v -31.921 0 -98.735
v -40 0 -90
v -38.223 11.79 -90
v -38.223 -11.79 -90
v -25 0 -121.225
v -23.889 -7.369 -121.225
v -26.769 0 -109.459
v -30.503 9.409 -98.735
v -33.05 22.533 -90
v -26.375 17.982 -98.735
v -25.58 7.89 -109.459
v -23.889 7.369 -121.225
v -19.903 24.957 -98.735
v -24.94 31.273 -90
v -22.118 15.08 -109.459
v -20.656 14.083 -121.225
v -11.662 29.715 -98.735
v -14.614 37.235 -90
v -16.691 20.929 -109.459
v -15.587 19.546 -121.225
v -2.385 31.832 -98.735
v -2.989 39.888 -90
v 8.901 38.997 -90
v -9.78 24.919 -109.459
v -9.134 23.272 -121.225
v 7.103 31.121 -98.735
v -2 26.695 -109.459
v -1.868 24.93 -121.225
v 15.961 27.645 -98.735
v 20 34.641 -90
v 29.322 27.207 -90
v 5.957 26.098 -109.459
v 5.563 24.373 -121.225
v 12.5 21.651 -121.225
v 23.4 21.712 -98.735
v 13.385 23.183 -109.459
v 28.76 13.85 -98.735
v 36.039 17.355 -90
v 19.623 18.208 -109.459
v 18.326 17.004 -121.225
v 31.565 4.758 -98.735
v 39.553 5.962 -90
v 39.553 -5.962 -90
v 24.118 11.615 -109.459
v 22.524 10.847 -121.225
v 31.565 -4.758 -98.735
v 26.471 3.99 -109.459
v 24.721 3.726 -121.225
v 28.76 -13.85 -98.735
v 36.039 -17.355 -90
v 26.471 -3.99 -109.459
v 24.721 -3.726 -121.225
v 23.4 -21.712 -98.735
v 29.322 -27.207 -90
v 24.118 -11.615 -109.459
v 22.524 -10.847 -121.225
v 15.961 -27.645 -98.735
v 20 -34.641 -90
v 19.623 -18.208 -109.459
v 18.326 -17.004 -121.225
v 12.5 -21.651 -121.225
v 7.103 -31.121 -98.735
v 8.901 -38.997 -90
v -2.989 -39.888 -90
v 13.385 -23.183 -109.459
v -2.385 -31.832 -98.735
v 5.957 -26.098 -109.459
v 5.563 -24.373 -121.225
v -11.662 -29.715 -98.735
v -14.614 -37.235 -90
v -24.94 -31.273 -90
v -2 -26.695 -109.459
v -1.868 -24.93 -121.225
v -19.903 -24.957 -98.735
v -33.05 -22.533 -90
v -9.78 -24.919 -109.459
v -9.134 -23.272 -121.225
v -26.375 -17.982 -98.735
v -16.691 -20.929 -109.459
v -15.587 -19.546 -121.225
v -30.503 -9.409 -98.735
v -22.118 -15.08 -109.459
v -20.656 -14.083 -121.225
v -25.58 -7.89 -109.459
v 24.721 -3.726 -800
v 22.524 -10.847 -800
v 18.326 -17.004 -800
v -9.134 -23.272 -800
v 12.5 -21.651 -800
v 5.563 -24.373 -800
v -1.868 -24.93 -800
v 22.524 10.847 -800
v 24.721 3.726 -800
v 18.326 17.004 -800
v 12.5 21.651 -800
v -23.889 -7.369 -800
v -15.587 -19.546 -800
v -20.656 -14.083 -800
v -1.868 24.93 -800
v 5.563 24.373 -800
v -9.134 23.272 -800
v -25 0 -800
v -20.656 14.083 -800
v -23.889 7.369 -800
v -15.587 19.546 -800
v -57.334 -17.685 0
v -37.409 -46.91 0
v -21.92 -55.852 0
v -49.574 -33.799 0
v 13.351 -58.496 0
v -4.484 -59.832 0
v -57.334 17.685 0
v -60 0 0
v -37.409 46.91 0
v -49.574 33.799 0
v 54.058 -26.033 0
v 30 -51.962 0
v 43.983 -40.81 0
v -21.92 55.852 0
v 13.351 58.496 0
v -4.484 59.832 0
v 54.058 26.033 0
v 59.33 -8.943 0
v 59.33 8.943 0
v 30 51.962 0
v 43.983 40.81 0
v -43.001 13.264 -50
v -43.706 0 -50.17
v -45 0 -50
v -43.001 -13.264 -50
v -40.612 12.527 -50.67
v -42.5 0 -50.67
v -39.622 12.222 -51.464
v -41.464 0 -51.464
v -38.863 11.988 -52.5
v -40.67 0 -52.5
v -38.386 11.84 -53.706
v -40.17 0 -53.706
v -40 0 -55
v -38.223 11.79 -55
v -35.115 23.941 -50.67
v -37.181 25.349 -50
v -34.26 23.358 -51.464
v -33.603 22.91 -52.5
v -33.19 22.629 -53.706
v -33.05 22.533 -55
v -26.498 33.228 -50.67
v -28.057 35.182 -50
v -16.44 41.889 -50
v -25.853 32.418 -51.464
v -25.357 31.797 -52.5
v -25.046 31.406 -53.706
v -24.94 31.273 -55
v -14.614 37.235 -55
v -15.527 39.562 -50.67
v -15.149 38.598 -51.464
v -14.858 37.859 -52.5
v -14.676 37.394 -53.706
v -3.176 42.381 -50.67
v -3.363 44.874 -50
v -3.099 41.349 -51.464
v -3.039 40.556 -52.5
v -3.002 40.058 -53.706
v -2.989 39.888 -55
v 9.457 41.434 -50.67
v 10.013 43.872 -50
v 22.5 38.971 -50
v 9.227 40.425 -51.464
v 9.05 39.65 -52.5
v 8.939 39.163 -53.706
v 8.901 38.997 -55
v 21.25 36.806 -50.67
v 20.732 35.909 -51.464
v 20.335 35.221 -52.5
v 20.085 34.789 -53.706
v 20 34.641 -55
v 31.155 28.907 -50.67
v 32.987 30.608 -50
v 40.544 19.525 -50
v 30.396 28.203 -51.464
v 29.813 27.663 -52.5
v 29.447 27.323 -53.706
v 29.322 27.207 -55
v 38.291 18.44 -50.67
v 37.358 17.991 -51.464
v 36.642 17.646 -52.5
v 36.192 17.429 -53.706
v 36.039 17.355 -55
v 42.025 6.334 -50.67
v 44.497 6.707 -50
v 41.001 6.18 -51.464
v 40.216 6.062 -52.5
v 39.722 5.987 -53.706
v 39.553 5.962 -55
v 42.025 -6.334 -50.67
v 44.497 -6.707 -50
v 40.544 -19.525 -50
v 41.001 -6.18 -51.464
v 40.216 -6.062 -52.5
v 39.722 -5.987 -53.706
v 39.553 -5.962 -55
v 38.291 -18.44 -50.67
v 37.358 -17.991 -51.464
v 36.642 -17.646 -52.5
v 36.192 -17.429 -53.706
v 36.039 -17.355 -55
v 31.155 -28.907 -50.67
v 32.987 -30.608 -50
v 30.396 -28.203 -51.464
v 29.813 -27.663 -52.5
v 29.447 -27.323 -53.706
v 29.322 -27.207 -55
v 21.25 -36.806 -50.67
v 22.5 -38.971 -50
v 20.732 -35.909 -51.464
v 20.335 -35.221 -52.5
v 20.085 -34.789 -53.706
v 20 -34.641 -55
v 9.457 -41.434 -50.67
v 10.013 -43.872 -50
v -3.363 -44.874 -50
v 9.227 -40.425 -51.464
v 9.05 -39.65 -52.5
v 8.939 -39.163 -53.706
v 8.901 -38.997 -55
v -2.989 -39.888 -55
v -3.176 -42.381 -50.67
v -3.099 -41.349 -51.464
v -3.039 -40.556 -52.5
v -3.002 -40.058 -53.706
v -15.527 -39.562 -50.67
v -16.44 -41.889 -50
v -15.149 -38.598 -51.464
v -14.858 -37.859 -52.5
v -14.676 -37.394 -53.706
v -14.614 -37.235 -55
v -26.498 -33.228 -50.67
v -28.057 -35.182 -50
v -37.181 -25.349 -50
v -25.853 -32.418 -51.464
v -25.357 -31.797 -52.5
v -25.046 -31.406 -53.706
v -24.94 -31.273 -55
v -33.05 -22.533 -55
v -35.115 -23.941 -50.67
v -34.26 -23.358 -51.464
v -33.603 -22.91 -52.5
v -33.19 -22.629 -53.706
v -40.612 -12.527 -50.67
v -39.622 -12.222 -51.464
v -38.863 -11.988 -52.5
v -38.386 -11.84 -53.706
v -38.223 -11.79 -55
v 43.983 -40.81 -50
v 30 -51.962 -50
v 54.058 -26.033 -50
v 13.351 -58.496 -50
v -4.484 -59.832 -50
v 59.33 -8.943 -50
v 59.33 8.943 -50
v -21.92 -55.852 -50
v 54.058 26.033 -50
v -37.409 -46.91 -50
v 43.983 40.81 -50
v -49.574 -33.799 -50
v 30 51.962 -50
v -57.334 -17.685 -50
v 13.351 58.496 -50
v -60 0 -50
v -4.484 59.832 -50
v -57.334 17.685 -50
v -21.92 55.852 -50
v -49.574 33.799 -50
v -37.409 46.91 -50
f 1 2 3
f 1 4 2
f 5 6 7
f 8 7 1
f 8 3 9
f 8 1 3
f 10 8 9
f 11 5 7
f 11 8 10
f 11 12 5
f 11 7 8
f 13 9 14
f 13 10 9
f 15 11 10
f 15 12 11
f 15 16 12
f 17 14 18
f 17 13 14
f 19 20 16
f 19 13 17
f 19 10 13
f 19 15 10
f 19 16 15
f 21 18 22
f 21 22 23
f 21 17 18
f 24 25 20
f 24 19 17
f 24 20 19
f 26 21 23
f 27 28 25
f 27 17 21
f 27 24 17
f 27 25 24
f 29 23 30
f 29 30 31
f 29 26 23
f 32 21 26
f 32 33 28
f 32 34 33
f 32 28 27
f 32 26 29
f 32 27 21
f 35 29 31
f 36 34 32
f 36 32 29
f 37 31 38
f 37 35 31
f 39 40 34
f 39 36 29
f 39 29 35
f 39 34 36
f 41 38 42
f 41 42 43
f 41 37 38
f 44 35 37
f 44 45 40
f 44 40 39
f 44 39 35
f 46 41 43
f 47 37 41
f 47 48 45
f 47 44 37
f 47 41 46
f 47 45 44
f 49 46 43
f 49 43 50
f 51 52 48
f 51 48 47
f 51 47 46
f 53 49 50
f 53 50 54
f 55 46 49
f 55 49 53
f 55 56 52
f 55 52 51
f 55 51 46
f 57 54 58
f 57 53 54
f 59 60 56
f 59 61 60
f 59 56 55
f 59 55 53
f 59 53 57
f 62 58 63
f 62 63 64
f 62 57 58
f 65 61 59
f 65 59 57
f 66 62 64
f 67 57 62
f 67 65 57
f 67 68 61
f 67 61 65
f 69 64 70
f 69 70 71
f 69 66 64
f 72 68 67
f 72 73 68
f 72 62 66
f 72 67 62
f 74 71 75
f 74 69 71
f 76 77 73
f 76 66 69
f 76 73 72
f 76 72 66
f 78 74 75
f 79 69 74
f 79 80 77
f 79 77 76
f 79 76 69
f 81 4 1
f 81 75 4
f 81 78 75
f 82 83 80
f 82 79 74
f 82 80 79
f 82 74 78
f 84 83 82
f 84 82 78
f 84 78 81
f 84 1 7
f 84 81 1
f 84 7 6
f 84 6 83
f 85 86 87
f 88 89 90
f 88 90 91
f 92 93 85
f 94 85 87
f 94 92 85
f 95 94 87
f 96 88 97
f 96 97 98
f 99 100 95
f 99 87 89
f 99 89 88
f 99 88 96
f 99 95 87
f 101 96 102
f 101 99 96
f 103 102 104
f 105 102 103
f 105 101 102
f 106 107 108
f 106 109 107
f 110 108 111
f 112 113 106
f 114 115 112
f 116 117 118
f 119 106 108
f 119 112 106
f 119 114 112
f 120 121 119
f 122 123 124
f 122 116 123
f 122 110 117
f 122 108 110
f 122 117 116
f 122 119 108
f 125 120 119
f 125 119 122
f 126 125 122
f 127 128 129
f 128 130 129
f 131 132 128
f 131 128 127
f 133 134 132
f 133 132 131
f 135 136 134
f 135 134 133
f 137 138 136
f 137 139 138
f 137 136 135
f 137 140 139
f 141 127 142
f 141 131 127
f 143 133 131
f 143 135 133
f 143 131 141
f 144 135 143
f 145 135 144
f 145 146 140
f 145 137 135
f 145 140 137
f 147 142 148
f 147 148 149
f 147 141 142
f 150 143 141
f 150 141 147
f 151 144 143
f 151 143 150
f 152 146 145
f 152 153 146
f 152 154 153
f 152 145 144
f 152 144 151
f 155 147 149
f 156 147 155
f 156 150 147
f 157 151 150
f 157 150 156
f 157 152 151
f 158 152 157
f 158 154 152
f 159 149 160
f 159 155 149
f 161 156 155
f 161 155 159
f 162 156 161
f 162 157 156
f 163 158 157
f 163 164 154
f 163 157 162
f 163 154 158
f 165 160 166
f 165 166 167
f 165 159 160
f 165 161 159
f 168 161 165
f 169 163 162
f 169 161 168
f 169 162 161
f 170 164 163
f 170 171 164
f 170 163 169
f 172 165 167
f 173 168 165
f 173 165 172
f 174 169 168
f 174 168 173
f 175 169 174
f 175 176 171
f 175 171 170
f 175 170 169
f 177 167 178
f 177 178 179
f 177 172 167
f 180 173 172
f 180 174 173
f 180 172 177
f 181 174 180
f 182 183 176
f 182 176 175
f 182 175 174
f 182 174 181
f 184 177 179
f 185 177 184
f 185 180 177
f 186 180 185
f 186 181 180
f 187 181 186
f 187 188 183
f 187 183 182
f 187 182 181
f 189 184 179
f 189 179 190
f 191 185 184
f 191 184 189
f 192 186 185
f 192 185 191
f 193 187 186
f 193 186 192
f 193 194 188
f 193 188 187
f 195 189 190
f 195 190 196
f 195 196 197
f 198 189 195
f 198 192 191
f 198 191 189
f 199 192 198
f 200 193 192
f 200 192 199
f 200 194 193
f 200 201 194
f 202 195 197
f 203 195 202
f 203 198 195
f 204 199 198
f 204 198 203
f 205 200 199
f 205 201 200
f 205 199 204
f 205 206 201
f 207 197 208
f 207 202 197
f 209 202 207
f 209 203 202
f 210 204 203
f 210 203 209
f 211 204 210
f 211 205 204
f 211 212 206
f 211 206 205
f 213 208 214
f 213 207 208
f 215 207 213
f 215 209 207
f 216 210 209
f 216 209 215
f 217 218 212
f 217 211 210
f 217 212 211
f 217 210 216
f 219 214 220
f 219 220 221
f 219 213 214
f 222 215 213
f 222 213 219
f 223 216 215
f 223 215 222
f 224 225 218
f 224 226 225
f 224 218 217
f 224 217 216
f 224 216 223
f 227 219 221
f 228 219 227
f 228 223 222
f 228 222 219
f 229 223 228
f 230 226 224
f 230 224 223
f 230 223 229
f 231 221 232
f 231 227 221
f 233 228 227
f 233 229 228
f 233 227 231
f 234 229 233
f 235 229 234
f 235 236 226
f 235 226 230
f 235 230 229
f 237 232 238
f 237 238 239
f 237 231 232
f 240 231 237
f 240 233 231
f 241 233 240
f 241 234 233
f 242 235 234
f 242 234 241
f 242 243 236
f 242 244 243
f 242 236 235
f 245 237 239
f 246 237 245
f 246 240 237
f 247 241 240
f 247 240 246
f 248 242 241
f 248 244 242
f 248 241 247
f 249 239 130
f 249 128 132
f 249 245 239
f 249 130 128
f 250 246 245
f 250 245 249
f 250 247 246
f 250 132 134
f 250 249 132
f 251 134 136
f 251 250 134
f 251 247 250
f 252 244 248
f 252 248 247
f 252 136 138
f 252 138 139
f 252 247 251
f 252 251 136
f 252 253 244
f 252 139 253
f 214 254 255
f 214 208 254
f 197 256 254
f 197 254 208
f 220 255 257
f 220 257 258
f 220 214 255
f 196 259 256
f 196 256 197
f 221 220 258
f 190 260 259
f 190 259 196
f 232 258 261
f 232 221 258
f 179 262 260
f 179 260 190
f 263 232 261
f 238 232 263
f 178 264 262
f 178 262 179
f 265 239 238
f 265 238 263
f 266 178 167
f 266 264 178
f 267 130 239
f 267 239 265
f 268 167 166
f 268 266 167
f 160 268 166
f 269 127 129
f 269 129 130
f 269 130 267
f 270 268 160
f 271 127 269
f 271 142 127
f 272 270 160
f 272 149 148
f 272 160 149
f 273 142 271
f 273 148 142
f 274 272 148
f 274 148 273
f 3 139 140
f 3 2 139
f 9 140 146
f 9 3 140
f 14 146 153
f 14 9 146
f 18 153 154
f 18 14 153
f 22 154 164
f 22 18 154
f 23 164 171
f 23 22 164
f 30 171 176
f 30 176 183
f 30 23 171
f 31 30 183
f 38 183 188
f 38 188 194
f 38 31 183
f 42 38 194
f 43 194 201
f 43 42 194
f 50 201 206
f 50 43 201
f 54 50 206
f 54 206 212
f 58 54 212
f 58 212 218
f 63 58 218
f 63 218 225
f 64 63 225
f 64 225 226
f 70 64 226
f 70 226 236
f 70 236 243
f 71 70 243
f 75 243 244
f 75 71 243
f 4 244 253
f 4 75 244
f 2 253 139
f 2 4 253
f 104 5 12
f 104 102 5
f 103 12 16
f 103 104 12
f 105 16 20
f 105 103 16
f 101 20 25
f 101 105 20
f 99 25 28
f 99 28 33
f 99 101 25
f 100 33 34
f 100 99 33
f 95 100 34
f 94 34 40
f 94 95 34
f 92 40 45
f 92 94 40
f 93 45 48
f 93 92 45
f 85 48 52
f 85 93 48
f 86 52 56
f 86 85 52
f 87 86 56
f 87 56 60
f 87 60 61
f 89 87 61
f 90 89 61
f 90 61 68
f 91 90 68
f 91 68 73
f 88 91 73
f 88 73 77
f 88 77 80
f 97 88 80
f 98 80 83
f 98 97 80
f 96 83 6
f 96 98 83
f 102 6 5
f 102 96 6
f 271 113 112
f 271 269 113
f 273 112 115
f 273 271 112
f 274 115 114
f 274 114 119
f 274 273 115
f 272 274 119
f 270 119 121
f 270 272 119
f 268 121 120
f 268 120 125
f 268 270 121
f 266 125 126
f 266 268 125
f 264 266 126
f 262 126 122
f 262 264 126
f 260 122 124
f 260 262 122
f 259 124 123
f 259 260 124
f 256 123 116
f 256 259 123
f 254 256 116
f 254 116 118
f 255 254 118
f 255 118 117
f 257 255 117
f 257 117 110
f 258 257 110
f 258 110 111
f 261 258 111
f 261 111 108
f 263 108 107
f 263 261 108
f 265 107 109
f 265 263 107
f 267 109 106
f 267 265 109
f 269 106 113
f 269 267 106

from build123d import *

# Parameters (mm, degrees)
F2_R = 5


# Not quite as in the source:
# - a fillet or chamfer that OpenCascade refuses, or shapes differently, is made with other operations: its cross-section is extruded or revolved along the edge and cut away or added


with BuildPart() as f1:
    # F0 (on Front) → F1 (revolve)
    with BuildSketch(Plane.XZ):
        Polygon((0, -800), (0, 0), (-60, 0), (-60, -50), (-40, -50), (-40, -90), (-25, -90), (-25, -800), align=None)
    revolve(axis=Axis((0, 0, -400), (0, 0, -1)))

    # F2
    f2_edges = [f1.edges().sort_by_distance(p)[0] for p in [
        (40, 0, -50),
    ]]
    fillet(f2_edges, radius=F2_R)

    # F3: fillet of radius 40 on 1 edges, made by hand

    # F3_s1 → F3_t2 (revolve)
    with BuildSketch(Plane.XZ):
        with BuildLine():
            ThreePointArc((-40, -90), (-28.9444872454, -103.9044819163), (-25, -121.224989992))
            Line((-25, -121.224989992), (-25, -90))
            Line((-25, -90), (-40, -90))
        make_face()
    revolve(axis=Axis((0, 0, -90), (0, 0, -1)))


solid = f1.part
